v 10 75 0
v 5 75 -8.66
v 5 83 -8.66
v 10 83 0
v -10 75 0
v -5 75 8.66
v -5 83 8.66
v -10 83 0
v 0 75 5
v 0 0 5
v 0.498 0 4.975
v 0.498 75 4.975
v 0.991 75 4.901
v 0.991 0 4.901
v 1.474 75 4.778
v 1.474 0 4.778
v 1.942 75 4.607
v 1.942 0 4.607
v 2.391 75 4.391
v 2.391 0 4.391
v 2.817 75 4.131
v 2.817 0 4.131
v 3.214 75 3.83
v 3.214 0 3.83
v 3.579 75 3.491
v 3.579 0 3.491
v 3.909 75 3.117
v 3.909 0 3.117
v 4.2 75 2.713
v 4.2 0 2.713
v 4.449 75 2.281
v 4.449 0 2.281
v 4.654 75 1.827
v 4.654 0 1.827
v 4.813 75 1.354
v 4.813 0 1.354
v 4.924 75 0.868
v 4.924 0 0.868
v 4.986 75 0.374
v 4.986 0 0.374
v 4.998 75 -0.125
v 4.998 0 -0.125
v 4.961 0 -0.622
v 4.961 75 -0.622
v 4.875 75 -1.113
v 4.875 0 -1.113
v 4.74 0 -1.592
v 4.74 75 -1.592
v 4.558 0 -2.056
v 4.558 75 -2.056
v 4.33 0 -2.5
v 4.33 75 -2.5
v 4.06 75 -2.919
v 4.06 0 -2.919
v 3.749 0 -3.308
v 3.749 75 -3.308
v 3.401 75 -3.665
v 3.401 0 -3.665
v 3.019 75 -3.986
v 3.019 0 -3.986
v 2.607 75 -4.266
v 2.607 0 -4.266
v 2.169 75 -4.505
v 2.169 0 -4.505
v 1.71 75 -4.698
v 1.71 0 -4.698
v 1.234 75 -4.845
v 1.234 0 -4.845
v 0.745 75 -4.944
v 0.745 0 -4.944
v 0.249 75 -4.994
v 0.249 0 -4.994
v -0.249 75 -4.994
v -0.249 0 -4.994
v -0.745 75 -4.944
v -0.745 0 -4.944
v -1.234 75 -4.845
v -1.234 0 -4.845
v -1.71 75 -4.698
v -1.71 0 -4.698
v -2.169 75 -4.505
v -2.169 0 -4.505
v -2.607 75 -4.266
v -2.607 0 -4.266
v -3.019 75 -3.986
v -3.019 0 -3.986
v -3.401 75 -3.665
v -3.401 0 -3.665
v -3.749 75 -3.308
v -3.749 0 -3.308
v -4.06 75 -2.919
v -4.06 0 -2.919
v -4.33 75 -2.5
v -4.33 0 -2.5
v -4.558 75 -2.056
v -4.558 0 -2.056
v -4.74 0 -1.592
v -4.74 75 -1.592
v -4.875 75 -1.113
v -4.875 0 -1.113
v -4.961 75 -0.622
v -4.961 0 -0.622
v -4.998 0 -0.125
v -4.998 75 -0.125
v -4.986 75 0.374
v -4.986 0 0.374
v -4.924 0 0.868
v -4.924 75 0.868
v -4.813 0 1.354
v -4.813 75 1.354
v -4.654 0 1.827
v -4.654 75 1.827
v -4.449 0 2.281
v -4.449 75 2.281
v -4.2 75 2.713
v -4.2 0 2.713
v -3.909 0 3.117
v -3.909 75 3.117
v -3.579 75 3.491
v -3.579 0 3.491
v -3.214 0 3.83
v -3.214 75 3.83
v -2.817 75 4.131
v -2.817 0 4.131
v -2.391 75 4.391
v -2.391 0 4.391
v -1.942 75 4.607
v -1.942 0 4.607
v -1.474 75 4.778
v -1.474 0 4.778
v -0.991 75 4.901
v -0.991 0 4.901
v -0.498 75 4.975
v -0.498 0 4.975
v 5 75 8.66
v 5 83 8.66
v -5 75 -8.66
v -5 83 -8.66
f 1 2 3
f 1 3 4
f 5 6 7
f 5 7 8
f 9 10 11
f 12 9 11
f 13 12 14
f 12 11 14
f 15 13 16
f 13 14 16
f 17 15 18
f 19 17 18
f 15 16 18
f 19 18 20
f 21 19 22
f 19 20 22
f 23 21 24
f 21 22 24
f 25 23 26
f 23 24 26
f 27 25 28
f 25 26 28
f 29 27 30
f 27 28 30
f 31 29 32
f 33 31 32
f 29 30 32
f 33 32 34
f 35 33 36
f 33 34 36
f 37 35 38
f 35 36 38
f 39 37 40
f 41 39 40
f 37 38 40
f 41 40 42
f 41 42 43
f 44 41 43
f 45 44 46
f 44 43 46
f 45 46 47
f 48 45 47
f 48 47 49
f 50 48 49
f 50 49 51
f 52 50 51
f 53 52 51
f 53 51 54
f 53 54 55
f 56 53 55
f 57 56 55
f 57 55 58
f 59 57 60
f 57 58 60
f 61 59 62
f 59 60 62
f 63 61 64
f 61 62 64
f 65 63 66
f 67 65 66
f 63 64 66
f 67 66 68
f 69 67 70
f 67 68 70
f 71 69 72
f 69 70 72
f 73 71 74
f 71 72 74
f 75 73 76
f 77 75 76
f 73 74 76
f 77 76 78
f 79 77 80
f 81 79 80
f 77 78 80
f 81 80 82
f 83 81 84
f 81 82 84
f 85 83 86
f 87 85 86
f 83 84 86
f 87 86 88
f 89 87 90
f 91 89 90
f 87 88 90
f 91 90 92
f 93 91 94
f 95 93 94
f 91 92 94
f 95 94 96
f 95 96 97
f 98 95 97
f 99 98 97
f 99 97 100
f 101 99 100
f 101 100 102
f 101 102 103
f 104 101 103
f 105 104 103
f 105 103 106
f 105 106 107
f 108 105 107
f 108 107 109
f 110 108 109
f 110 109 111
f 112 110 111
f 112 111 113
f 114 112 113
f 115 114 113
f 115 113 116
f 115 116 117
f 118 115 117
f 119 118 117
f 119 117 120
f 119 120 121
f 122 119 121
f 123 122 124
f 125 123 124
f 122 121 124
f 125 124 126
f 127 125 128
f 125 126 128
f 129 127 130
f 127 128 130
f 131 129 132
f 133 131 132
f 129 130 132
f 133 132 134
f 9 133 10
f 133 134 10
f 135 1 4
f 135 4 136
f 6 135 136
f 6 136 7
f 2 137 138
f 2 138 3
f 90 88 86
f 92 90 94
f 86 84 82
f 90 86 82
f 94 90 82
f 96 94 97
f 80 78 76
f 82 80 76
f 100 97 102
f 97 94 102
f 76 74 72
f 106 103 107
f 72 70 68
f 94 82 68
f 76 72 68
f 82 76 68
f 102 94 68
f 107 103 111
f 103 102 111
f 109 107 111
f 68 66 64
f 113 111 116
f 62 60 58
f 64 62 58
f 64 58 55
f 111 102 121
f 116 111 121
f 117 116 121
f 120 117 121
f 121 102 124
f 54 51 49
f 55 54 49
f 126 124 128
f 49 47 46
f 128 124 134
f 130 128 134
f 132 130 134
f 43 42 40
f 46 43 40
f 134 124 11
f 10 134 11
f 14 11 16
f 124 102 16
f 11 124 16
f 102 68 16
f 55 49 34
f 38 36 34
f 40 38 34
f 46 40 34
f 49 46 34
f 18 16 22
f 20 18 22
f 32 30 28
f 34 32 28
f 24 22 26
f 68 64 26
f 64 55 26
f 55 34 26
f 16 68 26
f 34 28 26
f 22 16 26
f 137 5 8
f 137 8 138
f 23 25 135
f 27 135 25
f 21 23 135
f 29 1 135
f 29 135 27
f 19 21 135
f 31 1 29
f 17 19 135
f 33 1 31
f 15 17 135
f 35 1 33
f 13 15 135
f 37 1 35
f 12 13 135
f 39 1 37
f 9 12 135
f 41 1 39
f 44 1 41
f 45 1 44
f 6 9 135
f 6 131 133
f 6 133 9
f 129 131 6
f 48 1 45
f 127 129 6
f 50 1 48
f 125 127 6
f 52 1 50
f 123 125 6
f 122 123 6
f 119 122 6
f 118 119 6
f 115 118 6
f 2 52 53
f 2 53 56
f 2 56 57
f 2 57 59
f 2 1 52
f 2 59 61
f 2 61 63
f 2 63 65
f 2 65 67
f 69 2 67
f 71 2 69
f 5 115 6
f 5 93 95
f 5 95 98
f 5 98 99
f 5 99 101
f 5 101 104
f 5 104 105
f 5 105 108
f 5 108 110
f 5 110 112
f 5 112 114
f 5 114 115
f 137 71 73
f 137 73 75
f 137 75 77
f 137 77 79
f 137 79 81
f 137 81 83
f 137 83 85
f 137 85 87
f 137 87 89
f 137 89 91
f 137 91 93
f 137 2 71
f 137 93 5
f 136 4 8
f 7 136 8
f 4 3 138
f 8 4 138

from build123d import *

# Parameters (mm, degrees)
ESQUISSE1_R        = 5
BOSS_EXTRU_1_DEPTH = 75
BOSS_EXTRU_2_DEPTH = 8


with BuildPart() as part:
    # Esquisse1 → Boss.-Extru.1 (new body)
    with BuildSketch(Plane(origin=(0, 0, 0), x_dir=(1, 0, 0), z_dir=(0, 1, 0))):
        with Locations(Location((0, 0, 0), (0, 0, 270))):
            Circle(ESQUISSE1_R)
    extrude(amount=BOSS_EXTRU_1_DEPTH)

    # Esquisse2 → Boss.-Extru.2 (add)
    with BuildSketch(Plane(origin=(0, 75, 0), x_dir=(1, 0, 0), z_dir=(0, 1, 0))):
        Polygon((-5, 8.660254038), (5, 8.660254038), (10, 0), (5, -8.660254038), (-5, -8.660254038), (-10, 0), align=None)
    extrude(amount=BOSS_EXTRU_2_DEPTH)


solid = part.part
